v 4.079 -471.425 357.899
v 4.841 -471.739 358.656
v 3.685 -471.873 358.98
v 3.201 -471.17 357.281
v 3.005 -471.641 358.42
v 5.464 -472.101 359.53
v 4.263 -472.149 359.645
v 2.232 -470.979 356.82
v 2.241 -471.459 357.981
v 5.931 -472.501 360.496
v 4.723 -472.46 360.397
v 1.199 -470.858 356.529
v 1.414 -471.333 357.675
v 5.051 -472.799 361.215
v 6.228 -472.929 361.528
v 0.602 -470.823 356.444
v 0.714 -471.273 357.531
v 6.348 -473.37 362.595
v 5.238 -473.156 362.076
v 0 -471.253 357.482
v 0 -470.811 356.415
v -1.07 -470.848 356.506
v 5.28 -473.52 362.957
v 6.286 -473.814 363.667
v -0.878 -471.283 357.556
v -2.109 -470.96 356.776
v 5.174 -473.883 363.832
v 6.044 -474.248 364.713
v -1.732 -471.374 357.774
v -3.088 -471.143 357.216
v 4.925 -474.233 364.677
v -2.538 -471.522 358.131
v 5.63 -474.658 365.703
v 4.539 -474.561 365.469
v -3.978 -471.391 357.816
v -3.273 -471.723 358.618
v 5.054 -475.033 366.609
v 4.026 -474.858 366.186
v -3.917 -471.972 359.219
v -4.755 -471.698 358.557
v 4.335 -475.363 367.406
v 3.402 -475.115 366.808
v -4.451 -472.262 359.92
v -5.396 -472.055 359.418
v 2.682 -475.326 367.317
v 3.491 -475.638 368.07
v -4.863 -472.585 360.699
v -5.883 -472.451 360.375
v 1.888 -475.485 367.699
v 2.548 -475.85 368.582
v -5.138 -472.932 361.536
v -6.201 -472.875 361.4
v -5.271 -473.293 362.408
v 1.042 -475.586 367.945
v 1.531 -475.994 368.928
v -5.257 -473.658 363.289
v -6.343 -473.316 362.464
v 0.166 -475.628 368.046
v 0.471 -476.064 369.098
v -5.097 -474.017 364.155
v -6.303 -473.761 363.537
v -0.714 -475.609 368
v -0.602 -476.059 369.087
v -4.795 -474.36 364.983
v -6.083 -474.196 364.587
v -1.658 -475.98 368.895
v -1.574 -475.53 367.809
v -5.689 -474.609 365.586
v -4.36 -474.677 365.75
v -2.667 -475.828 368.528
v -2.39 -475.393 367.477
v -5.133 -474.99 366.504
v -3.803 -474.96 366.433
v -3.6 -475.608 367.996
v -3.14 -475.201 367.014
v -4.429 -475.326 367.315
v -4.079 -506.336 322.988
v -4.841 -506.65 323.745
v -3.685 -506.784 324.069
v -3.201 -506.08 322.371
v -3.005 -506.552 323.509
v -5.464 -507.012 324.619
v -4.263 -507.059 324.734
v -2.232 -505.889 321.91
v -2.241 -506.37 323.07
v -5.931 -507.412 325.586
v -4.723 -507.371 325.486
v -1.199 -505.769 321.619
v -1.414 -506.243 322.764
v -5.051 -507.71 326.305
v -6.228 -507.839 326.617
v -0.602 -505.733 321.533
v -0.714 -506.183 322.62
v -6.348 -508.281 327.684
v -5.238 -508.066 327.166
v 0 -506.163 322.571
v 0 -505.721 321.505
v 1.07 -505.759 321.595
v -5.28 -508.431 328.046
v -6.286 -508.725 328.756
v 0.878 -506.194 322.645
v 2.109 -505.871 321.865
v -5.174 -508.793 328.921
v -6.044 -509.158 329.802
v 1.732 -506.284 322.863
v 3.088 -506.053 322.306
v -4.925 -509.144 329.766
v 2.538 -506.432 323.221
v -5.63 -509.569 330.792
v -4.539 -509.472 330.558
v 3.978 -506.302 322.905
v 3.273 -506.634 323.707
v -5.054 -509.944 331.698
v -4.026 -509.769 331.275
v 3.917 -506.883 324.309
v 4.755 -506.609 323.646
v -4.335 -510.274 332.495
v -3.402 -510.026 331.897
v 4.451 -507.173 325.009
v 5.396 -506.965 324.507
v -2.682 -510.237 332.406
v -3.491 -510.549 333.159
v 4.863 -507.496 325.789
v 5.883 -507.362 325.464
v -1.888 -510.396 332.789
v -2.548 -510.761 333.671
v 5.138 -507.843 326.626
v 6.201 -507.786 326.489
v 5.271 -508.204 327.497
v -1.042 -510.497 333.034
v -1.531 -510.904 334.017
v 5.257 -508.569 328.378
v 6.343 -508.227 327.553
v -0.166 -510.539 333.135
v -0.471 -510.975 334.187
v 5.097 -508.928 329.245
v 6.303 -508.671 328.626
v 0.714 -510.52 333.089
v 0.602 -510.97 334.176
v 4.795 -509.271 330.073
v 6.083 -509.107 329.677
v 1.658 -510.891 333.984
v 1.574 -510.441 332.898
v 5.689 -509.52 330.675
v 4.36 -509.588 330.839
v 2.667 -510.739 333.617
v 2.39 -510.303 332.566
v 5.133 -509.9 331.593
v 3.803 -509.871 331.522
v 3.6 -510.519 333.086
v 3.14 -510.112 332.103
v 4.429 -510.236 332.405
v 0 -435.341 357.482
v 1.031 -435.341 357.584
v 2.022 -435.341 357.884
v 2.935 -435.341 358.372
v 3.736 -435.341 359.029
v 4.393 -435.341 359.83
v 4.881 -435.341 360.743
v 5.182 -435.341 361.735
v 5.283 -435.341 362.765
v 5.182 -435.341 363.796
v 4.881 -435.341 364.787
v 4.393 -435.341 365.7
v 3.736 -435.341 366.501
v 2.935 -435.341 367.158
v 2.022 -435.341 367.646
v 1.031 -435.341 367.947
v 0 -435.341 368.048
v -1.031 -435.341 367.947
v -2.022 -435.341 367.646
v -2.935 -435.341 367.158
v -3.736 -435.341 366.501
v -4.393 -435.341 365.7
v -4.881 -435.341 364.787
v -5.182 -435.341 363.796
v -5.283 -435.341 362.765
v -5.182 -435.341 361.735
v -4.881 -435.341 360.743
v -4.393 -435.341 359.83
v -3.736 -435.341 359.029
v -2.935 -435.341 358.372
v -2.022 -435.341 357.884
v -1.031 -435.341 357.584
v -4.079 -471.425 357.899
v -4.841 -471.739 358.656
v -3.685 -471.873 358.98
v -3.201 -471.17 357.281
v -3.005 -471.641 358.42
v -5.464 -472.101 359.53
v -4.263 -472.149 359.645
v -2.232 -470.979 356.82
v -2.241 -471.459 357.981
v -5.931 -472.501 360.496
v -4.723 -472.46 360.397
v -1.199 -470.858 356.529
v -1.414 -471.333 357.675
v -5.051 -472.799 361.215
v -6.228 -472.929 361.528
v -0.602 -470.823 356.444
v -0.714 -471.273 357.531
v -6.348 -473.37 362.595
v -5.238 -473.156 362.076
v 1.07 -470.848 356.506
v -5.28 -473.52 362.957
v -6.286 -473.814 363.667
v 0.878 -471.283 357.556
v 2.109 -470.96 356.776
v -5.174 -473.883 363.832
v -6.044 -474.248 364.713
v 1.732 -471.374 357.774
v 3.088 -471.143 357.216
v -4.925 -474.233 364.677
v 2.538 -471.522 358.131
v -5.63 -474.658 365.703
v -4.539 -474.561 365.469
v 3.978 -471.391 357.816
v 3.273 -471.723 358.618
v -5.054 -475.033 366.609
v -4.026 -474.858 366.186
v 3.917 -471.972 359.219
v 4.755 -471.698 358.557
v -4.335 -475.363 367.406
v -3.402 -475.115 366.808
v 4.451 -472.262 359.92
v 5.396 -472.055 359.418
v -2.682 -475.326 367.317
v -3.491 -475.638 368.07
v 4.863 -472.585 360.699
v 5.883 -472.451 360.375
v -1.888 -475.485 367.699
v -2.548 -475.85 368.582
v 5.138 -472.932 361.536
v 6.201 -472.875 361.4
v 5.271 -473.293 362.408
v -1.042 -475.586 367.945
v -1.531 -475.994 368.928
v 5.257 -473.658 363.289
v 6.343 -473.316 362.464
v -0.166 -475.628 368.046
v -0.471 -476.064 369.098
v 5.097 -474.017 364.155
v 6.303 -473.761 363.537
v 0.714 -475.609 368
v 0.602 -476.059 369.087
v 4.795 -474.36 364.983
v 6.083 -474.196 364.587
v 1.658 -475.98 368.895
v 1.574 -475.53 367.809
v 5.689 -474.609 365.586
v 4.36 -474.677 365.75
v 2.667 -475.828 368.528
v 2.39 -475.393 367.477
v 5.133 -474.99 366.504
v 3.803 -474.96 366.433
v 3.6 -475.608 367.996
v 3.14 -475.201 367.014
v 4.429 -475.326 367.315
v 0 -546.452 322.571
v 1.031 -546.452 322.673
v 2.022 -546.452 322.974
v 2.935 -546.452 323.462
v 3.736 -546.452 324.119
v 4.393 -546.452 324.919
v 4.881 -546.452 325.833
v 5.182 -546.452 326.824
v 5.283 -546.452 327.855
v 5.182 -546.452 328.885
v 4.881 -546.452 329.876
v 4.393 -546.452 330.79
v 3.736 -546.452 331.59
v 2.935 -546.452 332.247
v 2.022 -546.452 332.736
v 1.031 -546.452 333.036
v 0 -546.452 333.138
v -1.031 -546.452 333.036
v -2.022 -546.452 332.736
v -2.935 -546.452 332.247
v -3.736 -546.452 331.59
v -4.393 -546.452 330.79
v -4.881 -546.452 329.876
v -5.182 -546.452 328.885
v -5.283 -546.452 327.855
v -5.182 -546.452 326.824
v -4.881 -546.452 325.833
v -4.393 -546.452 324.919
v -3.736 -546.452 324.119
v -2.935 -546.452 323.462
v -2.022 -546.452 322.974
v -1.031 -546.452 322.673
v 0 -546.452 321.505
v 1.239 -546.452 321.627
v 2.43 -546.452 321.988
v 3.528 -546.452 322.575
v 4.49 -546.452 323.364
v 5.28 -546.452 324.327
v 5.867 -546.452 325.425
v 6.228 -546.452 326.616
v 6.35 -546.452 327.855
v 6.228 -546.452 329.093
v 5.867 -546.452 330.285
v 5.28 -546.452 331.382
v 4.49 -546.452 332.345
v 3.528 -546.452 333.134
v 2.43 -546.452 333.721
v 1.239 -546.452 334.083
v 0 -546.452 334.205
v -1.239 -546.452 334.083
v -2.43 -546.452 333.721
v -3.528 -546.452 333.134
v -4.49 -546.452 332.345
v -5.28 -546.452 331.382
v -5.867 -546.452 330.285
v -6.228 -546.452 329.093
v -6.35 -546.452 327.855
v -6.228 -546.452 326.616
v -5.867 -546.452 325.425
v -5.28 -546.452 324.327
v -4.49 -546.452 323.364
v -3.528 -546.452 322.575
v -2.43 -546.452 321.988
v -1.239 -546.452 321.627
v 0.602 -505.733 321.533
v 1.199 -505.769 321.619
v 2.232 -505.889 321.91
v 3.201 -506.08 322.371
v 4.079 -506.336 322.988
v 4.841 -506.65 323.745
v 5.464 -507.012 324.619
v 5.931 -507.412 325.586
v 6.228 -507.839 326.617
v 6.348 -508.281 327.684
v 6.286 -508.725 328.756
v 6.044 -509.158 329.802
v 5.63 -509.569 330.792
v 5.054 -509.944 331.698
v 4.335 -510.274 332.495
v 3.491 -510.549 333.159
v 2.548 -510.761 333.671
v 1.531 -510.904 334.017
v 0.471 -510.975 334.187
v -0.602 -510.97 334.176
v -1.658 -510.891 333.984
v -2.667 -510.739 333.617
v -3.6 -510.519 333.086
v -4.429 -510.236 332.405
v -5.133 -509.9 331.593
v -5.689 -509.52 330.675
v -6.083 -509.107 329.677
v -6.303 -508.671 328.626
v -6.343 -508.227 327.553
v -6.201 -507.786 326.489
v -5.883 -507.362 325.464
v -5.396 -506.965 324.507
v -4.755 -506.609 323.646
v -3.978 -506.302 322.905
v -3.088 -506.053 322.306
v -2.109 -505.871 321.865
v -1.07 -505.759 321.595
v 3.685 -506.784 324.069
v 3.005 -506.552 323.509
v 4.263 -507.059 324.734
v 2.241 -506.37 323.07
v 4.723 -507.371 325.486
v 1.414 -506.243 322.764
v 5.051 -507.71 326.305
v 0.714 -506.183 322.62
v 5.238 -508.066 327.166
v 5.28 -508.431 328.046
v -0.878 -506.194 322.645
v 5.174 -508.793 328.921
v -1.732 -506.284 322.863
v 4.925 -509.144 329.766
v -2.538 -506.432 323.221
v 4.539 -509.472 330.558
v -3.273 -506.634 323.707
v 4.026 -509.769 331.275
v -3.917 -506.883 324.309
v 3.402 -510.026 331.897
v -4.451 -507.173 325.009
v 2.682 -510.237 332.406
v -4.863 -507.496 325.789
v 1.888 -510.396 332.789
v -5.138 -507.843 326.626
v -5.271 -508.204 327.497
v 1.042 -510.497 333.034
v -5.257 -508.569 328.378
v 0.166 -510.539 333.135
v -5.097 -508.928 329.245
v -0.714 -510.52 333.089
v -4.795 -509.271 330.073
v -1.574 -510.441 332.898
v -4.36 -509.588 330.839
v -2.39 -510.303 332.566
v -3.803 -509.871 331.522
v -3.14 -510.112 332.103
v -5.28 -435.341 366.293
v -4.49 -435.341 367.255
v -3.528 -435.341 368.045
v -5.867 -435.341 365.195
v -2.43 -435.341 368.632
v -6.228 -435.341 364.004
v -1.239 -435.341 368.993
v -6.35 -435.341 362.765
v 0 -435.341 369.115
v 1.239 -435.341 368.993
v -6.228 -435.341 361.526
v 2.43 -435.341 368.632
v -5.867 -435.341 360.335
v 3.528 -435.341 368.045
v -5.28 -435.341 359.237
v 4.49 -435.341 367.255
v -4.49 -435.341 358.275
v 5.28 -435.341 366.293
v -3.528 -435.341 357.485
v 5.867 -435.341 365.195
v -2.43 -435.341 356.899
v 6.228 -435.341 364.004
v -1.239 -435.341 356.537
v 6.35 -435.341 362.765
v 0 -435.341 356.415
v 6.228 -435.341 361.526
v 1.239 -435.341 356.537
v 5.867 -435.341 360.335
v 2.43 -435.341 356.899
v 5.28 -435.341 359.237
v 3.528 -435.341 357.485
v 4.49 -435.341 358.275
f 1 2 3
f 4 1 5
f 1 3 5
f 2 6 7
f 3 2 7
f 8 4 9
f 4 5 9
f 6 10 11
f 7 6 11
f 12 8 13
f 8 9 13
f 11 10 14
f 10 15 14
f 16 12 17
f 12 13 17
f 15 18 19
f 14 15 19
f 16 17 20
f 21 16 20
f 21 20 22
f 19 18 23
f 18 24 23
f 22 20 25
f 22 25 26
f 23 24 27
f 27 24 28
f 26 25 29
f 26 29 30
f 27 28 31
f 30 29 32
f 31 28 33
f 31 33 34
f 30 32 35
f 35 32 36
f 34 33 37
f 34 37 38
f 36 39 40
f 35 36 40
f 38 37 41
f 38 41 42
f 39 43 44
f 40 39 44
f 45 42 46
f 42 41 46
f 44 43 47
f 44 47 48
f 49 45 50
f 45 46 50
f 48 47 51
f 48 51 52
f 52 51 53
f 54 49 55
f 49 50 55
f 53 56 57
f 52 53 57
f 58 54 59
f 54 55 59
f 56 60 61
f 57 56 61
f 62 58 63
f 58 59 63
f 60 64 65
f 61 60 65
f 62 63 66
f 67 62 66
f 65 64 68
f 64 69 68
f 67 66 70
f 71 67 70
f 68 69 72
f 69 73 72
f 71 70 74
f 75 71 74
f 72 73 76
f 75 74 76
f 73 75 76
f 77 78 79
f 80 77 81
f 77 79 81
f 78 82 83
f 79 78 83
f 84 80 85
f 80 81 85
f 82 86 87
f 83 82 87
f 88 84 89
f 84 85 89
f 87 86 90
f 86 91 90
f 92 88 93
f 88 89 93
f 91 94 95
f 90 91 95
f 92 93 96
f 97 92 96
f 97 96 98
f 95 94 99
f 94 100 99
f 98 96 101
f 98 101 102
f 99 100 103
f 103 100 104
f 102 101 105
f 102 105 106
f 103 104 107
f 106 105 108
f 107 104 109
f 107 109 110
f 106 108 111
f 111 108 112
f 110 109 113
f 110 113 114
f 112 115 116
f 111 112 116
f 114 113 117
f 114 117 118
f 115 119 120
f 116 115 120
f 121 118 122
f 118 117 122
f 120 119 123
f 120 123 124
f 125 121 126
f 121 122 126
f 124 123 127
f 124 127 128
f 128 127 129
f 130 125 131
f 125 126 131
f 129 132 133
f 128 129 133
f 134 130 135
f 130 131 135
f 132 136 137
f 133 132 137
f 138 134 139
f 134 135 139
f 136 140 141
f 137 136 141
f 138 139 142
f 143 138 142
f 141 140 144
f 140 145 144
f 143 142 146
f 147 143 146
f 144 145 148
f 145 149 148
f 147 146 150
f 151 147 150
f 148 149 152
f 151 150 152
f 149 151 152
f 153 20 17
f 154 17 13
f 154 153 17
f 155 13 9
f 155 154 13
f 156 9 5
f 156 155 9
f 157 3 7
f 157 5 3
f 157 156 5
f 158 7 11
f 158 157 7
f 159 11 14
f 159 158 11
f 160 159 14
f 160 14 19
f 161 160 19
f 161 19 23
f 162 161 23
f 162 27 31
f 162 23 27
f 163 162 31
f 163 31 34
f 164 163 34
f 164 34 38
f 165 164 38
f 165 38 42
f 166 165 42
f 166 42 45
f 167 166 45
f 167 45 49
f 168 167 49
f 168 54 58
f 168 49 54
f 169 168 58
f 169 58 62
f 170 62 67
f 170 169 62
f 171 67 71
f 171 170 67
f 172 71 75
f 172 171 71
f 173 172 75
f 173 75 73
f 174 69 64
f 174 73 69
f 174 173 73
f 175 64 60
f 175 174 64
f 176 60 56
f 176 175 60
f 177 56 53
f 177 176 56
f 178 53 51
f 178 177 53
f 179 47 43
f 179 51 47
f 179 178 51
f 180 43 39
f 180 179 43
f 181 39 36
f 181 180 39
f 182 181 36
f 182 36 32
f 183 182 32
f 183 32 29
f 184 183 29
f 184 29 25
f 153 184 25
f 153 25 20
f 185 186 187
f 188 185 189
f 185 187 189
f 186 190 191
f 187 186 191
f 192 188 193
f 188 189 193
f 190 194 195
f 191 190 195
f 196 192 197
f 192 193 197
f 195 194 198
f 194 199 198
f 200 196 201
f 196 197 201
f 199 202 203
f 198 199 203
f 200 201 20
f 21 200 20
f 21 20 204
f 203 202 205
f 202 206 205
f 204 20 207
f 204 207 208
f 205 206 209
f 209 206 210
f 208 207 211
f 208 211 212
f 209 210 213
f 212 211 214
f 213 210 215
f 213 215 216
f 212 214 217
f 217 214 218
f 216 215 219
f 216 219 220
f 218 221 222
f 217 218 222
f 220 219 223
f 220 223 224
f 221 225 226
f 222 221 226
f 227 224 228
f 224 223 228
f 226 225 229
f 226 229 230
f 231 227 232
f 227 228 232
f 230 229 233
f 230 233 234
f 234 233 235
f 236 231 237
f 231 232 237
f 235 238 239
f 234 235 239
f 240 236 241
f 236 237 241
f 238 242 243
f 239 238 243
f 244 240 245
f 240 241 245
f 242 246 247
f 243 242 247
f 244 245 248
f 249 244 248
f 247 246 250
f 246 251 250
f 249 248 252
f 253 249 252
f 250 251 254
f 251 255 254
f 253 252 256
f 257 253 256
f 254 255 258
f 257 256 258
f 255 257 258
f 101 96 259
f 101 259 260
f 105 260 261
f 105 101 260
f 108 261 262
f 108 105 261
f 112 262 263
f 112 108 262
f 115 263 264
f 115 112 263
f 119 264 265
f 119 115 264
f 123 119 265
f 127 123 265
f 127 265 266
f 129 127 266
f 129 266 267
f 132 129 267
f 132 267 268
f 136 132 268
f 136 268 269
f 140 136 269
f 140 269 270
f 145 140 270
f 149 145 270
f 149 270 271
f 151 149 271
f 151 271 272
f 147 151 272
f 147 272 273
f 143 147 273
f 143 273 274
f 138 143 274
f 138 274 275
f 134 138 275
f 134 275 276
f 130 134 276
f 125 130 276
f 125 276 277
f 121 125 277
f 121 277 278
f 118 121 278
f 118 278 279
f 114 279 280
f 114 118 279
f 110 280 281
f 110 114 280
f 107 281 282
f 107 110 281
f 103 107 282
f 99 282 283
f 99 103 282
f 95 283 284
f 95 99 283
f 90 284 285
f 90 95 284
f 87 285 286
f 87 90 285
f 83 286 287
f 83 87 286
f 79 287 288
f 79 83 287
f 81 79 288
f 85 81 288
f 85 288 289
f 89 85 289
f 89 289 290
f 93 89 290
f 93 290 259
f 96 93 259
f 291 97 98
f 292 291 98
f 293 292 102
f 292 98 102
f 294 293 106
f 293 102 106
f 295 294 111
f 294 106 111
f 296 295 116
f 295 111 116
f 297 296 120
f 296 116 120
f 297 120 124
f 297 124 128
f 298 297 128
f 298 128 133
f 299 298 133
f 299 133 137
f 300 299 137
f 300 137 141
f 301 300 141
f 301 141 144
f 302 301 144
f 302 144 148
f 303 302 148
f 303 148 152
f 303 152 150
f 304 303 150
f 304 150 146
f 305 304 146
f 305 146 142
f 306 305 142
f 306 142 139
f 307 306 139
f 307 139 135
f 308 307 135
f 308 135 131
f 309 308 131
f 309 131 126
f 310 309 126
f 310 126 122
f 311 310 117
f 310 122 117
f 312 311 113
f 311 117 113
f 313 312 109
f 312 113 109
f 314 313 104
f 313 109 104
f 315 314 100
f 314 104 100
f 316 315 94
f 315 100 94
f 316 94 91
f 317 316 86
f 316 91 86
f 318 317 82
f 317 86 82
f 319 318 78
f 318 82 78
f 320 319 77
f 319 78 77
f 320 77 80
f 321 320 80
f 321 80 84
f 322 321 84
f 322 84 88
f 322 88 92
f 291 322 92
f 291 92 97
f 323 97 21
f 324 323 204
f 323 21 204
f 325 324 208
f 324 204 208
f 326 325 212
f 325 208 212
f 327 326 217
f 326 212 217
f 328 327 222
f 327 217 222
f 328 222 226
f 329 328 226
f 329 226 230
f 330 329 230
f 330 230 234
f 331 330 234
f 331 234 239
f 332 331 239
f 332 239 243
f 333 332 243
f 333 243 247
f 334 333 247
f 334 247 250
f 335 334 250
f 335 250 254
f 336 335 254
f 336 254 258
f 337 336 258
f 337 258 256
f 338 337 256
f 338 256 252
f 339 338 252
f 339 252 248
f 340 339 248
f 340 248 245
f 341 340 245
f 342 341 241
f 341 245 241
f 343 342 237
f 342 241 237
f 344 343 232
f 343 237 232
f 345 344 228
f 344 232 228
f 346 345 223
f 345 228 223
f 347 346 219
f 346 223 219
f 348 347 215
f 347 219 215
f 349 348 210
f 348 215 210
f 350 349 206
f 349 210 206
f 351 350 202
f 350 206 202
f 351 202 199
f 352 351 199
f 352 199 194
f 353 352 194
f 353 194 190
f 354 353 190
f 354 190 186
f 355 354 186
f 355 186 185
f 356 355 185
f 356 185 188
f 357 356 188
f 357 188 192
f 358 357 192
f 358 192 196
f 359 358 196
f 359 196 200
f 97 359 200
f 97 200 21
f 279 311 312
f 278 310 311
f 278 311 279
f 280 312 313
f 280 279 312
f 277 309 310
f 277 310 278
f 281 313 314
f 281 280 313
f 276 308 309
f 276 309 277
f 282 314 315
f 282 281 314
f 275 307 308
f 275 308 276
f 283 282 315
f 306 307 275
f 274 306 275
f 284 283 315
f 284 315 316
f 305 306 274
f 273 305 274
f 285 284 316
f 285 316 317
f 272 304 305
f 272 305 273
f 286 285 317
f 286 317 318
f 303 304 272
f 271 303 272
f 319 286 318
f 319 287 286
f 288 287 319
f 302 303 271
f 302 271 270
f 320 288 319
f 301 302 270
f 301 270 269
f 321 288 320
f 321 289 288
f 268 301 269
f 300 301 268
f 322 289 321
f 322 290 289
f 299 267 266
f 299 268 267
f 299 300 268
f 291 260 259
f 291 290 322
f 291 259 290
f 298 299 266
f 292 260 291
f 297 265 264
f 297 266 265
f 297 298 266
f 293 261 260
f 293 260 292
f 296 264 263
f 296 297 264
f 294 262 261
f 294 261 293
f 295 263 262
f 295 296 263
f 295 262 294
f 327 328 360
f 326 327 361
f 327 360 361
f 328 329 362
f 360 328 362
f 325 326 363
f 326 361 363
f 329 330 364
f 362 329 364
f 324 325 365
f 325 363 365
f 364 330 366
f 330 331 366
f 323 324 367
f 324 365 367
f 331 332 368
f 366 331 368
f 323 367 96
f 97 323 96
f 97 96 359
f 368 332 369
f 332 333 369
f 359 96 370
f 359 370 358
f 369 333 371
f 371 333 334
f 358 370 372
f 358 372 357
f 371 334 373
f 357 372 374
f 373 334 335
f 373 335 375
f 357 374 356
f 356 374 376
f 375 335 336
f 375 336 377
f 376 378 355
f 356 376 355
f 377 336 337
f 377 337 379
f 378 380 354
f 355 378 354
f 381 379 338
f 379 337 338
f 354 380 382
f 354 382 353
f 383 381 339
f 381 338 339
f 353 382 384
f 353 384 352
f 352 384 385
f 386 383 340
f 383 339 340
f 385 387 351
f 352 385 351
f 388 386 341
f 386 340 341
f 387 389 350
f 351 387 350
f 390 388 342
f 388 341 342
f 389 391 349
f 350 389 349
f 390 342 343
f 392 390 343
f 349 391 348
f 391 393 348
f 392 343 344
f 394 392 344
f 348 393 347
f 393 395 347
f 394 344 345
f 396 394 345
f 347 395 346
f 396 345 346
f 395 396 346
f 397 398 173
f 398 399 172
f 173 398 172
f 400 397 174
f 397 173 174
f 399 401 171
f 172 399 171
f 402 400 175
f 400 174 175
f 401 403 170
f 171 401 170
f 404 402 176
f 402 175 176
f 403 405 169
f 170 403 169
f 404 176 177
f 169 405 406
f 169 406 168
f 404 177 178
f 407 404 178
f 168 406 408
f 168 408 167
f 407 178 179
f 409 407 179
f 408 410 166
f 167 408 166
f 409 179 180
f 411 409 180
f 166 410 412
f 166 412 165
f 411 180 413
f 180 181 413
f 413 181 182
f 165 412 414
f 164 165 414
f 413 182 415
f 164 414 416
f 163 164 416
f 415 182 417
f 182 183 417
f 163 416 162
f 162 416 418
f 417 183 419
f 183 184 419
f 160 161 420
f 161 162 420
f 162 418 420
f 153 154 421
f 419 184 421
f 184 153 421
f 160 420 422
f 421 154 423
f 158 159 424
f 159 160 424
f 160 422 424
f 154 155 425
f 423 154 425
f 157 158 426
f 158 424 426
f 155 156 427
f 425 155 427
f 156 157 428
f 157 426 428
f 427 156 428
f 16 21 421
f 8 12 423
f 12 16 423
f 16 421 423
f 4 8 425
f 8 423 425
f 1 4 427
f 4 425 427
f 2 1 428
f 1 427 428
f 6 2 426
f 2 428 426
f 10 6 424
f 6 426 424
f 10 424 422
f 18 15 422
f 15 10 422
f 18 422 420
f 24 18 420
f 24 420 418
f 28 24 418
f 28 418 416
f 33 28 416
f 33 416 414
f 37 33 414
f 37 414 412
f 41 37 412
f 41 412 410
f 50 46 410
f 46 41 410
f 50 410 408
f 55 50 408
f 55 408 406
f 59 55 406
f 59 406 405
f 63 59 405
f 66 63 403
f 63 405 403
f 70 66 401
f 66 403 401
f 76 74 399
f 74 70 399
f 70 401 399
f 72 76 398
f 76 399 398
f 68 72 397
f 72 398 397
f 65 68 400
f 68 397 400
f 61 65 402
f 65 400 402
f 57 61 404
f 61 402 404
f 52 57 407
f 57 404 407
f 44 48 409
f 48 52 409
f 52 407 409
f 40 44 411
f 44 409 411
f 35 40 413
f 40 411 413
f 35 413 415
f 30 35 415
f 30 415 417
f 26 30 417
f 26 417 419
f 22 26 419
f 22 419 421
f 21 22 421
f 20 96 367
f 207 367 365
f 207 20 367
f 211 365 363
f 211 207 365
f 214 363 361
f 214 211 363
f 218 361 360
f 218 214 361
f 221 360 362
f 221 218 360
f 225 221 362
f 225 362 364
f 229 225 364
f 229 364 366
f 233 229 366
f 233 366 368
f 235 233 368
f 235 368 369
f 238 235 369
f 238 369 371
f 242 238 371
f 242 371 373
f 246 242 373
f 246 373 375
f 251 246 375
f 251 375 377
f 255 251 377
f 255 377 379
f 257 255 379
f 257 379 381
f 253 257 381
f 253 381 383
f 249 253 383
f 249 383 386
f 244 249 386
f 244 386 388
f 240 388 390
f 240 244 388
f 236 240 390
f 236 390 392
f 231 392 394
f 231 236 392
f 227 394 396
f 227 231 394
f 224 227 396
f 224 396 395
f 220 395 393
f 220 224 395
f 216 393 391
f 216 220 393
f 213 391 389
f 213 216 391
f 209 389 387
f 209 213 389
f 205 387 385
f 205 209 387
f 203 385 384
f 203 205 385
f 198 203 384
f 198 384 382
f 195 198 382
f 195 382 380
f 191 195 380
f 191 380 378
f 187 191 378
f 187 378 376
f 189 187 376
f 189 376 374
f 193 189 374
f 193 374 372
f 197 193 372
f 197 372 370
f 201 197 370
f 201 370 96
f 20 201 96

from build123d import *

# Parameters (mm, degrees)
SKETCH11_R                = 6.35
SKETCH11_R_2              = 5.2832
PIPE_0_5_SCH_40_1_DEPTH   = 42.819743879
SKETCH11_ON_SEGMENT_2_R   = 6.35
SKETCH11_ON_SEGMENT_2_R_2 = 5.2832
PIPE_0_5_SCH_40_1_2_DEPTH = 58.810656537
SKETCH11_ON_SEGMENT_3_R   = 6.35
SKETCH11_ON_SEGMENT_3_R_2 = 5.2832
PIPE_0_5_SCH_40_1_3_DEPTH = 42.819743879


with BuildPart() as part:
    # Sketch11 → Pipe 0.5 SCH 40(1) (new body)
    with BuildSketch(Plane(origin=(0, -435.341064838, 362.765281468), x_dir=(0, 0, -1), z_dir=(0, -1, 0))):
        Circle(SKETCH11_R)
        Circle(SKETCH11_R_2, mode=Mode.SUBTRACT)
    extrude(amount=PIPE_0_5_SCH_40_1_DEPTH)

    # Pipe 0.5 SCH 40(1) mitre 1
    split(bisect_by=Plane(origin=(0, -473.441064838, 362.765281468), x_dir=(-1, 0, 0), z_dir=(0, 0.923879533, 0.382683432)), keep=Keep.TOP)


with BuildPart() as body_2:
    # Sketch11 on segment 2 (carried to segment 2) → Pipe 0.5 SCH 40_1 2 (new body)
    with BuildSketch(Plane(origin=(0, -470.103701936, 366.10264437), x_dir=(0, 0.707106781, -0.707106781), z_dir=(0, -0.707106781, -0.707106781))):
        Circle(SKETCH11_ON_SEGMENT_2_R)
        Circle(SKETCH11_ON_SEGMENT_2_R_2, mode=Mode.SUBTRACT)
    extrude(amount=PIPE_0_5_SCH_40_1_2_DEPTH)

    # Pipe 0.5 SCH 40_1 2 mitre 1
    split(bisect_by=Plane(origin=(0, -473.441064838, 362.765281468), x_dir=(1, 0, 0), z_dir=(0, -0.923879533, -0.382683432)), keep=Keep.TOP)

    # Pipe 0.5 SCH 40_1 2 mitre 2
    split(bisect_by=Plane(origin=(0, -508.351753077, 327.854593229), x_dir=(-1, 0, 0), z_dir=(0, 0.923879533, 0.382683432)), keep=Keep.TOP)


with BuildPart() as body_3:
    # Sketch11 on segment 3 (carried to segment 3) → Pipe 0.5 SCH 40_1 3 (new body)
    with BuildSketch(Plane(origin=(0, -503.632009198, 327.854593229), x_dir=(0, 0, -1), z_dir=(0, -1, 0))):
        Circle(SKETCH11_ON_SEGMENT_3_R)
        Circle(SKETCH11_ON_SEGMENT_3_R_2, mode=Mode.SUBTRACT)
    extrude(amount=PIPE_0_5_SCH_40_1_3_DEPTH)

    # Pipe 0.5 SCH 40_1 3 mitre 1
    split(bisect_by=Plane(origin=(0, -508.351753077, 327.854593229), x_dir=(1, 0, 0), z_dir=(0, -0.923879533, -0.382683432)), keep=Keep.TOP)


solid = Compound([part.part, body_2.part, body_3.part])
